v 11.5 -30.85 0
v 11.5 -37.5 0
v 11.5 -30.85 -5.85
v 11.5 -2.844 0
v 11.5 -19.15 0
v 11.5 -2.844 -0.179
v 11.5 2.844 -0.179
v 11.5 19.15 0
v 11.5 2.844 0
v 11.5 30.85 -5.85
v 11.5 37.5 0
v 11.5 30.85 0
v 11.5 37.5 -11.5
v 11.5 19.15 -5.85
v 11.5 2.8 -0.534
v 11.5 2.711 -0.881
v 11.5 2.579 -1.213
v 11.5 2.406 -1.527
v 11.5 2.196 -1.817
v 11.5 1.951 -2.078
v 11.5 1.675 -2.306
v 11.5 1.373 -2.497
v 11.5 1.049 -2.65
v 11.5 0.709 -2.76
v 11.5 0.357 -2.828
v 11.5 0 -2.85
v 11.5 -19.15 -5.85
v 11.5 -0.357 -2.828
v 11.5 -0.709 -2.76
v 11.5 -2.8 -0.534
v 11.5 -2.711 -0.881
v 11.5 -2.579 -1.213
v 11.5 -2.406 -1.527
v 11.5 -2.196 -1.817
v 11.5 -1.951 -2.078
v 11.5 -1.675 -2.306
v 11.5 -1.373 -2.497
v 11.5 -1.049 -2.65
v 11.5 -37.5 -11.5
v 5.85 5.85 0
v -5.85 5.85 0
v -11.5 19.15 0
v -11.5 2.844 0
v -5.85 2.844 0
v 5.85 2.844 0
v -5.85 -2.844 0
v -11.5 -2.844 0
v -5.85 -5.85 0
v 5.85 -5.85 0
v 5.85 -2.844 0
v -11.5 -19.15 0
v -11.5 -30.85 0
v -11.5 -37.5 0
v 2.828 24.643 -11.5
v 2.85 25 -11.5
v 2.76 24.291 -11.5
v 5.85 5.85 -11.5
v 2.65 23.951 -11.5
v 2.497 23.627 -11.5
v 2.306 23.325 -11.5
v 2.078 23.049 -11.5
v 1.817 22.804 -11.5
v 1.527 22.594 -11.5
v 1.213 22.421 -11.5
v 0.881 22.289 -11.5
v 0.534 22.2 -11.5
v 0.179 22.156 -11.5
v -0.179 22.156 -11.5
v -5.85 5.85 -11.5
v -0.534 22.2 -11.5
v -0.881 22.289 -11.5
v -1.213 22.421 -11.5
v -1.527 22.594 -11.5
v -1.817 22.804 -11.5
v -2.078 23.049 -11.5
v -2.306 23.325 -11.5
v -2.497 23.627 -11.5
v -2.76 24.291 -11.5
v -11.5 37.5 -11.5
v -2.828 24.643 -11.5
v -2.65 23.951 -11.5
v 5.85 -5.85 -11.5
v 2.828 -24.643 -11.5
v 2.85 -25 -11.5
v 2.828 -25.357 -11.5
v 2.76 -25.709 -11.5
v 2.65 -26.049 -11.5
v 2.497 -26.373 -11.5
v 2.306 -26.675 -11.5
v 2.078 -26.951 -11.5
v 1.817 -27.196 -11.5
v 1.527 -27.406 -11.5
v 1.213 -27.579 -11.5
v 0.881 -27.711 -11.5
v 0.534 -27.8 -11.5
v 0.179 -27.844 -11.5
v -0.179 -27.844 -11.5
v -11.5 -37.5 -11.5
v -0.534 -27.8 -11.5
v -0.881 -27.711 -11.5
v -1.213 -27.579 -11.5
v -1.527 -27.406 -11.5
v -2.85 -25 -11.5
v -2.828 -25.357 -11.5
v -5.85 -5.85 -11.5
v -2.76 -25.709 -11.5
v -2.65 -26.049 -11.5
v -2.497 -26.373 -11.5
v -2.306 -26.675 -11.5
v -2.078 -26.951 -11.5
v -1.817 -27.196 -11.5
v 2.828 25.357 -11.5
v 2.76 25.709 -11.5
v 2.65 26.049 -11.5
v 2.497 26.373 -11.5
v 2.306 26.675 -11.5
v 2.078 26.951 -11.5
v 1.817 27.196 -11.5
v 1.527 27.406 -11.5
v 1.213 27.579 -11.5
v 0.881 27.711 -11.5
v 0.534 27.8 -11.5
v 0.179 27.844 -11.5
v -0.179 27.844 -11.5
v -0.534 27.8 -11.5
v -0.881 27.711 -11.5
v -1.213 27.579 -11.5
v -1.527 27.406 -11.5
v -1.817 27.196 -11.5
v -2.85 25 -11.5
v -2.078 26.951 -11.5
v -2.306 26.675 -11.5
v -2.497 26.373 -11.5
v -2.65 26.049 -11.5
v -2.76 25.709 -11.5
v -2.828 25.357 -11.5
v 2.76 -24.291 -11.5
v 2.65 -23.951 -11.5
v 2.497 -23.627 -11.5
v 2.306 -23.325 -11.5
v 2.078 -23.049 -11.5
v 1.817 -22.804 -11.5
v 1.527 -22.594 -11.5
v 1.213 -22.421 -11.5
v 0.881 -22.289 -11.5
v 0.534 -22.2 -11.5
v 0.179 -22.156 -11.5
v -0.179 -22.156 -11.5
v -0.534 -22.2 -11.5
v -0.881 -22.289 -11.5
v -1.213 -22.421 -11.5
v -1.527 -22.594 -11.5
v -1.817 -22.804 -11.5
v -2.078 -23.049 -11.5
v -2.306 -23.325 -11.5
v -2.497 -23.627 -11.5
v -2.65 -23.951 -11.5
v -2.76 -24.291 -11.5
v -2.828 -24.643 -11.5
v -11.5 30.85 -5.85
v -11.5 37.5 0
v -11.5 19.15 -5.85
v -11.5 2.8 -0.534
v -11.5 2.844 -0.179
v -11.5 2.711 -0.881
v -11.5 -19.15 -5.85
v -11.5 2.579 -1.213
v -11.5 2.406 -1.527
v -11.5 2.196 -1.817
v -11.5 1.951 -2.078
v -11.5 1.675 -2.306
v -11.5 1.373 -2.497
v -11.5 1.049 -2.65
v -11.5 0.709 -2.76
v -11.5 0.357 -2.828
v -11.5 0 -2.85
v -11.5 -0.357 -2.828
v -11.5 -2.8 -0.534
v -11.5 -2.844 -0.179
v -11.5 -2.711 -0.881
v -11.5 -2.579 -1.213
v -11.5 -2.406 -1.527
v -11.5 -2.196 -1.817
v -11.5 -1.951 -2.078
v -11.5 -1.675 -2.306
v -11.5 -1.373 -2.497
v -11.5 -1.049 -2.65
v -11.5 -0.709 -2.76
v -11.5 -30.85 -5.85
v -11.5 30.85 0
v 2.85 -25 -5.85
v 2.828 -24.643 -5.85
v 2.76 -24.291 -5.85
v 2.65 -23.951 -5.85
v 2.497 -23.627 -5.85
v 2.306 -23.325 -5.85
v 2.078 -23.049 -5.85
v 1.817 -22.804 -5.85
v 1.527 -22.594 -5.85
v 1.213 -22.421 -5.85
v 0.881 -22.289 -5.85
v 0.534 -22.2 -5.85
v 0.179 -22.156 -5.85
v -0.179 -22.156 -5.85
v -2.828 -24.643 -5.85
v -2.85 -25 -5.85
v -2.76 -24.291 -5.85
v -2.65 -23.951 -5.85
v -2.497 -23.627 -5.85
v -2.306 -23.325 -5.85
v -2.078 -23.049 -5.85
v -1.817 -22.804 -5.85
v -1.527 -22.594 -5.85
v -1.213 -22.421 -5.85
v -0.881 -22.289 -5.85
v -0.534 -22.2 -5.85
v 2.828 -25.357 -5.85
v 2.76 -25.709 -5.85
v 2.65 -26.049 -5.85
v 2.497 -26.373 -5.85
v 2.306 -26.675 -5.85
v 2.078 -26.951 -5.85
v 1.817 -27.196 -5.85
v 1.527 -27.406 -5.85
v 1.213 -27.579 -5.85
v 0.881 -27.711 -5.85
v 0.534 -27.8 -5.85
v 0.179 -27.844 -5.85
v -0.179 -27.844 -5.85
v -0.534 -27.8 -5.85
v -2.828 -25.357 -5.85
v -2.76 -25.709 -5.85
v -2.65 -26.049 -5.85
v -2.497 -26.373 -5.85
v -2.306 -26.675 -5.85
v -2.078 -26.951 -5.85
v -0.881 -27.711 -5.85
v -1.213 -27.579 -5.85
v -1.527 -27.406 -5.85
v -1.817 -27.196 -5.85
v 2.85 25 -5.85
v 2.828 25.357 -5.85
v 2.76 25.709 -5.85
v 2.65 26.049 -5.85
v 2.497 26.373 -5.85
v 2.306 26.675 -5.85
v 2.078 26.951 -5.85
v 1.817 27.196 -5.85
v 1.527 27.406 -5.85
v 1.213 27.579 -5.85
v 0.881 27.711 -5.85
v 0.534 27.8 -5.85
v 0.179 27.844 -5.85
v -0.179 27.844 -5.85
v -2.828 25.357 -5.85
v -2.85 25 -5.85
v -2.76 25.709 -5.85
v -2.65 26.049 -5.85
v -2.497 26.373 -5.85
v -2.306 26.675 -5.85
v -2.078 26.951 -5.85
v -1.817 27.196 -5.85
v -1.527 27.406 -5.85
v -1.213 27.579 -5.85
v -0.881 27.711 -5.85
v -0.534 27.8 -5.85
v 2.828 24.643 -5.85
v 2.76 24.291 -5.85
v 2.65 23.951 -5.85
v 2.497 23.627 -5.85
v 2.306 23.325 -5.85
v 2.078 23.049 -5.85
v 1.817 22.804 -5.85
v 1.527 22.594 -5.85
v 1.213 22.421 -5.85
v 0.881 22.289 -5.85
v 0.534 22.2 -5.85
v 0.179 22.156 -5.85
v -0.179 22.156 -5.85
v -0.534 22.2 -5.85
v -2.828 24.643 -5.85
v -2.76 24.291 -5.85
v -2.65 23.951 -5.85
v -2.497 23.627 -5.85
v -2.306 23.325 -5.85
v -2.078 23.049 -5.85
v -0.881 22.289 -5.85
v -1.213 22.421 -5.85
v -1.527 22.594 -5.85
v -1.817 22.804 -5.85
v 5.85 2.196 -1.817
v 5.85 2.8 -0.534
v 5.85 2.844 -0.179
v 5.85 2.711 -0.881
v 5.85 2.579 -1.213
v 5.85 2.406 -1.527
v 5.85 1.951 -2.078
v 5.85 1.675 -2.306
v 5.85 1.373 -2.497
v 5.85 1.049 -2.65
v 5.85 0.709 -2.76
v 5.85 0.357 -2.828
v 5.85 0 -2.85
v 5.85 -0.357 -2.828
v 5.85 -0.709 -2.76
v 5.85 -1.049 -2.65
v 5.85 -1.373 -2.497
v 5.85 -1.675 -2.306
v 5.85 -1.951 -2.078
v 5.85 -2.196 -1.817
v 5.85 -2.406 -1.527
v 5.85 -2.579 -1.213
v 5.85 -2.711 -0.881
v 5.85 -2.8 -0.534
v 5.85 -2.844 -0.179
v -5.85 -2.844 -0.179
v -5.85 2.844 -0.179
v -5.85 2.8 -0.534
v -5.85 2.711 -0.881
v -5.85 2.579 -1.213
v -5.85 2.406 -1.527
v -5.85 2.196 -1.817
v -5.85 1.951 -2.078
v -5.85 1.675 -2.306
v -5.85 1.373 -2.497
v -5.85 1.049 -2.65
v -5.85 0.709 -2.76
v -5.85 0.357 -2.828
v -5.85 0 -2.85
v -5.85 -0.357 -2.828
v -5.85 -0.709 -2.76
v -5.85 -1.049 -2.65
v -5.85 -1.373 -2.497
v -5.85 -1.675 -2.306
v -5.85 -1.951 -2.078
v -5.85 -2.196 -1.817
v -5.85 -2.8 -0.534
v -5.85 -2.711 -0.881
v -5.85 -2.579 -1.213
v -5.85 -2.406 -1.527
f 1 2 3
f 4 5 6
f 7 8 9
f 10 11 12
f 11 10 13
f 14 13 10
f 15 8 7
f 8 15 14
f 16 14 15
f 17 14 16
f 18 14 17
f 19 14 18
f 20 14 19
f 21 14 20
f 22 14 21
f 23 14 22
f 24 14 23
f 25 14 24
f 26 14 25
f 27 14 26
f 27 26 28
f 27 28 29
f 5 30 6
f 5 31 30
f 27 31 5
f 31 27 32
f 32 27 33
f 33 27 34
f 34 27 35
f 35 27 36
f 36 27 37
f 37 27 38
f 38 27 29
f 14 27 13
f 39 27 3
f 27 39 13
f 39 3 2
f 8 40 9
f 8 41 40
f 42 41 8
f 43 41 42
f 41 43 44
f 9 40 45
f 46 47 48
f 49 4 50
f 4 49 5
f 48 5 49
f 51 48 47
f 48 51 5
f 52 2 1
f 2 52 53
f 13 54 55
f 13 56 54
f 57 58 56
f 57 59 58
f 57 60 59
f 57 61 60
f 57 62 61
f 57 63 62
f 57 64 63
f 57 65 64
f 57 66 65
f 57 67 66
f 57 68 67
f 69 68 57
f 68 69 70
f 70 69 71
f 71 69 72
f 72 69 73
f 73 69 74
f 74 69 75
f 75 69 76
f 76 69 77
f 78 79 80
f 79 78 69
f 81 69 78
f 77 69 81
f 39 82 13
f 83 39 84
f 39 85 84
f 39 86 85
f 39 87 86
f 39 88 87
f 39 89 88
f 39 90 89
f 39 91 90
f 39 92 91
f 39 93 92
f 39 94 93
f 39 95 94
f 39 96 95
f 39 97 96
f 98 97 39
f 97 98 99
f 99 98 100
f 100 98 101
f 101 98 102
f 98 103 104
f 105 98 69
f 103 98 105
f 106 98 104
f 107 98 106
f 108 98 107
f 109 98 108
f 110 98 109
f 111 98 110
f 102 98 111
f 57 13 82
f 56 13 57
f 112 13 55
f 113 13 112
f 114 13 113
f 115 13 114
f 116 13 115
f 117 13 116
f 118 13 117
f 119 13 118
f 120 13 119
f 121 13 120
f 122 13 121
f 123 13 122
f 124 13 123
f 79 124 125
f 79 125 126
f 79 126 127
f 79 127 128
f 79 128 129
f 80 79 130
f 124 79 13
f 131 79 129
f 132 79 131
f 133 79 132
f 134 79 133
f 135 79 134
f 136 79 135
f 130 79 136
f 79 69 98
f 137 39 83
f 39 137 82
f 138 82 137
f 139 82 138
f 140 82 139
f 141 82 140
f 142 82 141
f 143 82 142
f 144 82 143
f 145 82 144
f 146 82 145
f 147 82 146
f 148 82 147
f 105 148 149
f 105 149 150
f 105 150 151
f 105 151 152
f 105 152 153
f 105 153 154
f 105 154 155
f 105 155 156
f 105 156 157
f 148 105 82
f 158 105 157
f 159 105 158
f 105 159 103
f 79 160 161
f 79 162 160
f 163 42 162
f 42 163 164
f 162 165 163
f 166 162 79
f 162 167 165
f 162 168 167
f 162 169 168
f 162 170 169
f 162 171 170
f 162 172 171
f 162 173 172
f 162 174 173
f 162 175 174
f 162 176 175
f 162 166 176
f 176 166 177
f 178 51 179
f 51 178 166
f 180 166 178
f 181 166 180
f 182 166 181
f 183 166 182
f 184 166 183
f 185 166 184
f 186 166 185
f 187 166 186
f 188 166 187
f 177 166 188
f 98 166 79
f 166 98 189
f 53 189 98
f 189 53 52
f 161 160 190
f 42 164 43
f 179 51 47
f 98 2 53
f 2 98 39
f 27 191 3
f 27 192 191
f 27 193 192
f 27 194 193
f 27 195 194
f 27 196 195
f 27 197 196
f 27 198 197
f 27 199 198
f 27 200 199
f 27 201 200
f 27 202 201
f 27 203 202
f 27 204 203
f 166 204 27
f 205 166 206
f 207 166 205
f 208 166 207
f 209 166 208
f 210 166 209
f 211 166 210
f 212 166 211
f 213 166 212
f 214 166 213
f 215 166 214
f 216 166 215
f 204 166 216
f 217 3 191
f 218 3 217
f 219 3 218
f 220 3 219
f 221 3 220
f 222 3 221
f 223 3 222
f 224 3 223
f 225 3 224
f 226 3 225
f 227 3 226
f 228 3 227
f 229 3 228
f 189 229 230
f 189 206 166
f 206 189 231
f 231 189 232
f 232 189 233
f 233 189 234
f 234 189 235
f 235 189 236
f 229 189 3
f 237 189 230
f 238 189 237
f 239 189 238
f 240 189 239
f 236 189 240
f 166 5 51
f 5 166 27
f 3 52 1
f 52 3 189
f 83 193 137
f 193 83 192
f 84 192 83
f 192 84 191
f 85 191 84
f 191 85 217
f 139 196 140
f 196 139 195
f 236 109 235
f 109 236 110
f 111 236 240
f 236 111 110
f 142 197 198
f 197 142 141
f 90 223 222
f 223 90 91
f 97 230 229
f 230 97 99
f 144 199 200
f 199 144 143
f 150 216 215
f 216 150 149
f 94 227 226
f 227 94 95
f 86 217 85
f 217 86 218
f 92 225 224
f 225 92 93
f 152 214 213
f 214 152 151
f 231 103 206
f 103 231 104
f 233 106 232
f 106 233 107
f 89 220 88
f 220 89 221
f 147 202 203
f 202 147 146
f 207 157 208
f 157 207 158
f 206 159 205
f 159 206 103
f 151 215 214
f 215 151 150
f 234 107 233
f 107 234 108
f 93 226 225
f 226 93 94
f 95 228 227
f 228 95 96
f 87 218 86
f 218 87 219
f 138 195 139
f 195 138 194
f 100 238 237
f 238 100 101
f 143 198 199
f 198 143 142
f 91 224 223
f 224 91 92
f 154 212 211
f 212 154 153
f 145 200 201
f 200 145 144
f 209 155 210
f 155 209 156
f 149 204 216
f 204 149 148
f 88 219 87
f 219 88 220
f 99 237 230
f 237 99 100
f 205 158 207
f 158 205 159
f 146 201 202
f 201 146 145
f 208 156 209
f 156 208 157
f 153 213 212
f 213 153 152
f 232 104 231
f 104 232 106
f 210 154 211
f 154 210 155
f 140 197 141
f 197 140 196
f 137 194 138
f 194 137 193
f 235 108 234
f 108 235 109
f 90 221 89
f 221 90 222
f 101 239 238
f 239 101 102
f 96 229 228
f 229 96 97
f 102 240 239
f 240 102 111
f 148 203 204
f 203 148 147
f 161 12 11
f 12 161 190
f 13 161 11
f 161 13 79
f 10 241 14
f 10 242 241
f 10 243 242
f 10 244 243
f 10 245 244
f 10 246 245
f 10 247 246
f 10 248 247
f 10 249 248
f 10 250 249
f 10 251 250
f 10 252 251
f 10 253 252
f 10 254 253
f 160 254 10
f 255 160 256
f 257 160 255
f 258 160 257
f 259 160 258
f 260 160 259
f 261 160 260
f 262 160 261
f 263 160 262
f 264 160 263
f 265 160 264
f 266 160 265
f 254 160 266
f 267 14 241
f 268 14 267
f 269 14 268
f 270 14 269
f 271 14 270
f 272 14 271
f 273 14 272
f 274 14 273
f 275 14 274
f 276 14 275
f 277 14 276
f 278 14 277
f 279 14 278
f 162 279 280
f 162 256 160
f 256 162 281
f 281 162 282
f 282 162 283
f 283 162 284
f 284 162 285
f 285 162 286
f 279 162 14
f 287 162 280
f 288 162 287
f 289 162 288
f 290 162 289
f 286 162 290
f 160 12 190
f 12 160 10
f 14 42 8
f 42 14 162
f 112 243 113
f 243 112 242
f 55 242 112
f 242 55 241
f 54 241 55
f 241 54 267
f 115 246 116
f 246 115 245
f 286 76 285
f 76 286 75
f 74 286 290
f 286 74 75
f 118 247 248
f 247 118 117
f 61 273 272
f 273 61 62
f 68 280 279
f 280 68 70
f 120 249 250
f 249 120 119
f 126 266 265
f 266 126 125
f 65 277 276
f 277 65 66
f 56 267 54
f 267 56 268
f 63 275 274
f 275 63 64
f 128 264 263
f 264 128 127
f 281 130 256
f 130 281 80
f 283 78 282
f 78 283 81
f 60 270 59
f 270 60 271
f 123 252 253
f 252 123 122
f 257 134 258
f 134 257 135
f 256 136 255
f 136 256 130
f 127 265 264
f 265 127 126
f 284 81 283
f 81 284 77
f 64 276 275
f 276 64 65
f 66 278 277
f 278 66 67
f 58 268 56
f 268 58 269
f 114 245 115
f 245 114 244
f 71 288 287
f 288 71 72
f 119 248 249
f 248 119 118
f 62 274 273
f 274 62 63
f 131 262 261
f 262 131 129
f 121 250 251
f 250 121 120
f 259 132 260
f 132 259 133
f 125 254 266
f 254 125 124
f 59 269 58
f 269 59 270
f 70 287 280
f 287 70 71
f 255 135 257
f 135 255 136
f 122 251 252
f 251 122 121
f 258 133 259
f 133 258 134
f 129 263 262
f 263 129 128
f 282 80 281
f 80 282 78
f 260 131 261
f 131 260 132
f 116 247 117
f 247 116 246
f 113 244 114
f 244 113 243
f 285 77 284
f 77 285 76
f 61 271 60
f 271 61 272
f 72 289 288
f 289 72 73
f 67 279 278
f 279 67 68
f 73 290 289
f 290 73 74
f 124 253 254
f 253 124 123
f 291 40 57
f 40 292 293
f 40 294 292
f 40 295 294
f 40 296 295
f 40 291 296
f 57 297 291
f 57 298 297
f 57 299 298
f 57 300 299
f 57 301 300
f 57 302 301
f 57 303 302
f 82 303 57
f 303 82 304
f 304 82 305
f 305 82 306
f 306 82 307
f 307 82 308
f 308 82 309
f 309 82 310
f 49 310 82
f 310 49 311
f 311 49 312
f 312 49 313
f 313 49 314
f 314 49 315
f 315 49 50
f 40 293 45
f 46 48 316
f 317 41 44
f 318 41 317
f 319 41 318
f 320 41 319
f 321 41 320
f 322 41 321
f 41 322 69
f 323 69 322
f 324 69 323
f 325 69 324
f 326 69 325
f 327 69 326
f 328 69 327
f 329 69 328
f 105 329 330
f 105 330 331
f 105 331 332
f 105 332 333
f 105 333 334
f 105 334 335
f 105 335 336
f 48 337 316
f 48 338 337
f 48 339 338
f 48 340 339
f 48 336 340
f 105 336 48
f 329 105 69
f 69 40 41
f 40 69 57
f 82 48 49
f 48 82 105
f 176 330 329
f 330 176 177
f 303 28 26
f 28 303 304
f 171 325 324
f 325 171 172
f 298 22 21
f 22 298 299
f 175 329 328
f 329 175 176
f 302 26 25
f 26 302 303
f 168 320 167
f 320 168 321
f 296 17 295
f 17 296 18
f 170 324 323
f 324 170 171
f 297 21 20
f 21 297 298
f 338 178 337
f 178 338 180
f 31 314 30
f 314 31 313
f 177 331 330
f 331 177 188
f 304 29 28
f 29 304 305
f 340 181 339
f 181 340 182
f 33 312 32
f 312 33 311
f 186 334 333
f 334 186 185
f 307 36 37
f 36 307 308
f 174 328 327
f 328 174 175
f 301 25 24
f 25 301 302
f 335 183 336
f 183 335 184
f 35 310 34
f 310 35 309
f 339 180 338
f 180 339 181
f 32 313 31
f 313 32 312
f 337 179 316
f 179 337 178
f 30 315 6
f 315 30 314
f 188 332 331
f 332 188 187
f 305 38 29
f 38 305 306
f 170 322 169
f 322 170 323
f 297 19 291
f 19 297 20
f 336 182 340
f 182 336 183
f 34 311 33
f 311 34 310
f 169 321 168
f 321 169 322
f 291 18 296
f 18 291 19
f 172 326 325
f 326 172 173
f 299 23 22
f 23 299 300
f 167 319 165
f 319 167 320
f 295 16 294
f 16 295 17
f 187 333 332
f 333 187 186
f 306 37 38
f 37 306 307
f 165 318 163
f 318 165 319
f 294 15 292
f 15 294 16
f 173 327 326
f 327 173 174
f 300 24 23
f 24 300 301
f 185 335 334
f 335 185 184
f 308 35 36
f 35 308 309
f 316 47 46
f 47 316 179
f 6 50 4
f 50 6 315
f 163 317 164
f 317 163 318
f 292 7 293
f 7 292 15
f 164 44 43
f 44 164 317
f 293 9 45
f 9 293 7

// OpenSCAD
stab_d = 11.7;
blockh = 23;

module klemmteil() {
	translate([0,0,-blockh/4]) difference() {
		cube([23, 25, blockh/2], true);
		translate([0,0, blockh/4]) cube([100, stab_d, stab_d], true);
		cylinder(h=100, r=5.7/2, $fn=50, center=true);
	}
}

difference() {
	union() {
		translate([0, -50/2, 0]) klemmteil();
		translate([0, +50/2, 0]) klemmteil();
		translate([0,0,-blockh/4]) cube([23, 25, blockh/2], true);
	}
	cube([stab_d, stab_d, 100], true);
	rotate(90, [0,1,0]) cylinder(h=100, center=true, r=5.7/2, $fn=50);
}
